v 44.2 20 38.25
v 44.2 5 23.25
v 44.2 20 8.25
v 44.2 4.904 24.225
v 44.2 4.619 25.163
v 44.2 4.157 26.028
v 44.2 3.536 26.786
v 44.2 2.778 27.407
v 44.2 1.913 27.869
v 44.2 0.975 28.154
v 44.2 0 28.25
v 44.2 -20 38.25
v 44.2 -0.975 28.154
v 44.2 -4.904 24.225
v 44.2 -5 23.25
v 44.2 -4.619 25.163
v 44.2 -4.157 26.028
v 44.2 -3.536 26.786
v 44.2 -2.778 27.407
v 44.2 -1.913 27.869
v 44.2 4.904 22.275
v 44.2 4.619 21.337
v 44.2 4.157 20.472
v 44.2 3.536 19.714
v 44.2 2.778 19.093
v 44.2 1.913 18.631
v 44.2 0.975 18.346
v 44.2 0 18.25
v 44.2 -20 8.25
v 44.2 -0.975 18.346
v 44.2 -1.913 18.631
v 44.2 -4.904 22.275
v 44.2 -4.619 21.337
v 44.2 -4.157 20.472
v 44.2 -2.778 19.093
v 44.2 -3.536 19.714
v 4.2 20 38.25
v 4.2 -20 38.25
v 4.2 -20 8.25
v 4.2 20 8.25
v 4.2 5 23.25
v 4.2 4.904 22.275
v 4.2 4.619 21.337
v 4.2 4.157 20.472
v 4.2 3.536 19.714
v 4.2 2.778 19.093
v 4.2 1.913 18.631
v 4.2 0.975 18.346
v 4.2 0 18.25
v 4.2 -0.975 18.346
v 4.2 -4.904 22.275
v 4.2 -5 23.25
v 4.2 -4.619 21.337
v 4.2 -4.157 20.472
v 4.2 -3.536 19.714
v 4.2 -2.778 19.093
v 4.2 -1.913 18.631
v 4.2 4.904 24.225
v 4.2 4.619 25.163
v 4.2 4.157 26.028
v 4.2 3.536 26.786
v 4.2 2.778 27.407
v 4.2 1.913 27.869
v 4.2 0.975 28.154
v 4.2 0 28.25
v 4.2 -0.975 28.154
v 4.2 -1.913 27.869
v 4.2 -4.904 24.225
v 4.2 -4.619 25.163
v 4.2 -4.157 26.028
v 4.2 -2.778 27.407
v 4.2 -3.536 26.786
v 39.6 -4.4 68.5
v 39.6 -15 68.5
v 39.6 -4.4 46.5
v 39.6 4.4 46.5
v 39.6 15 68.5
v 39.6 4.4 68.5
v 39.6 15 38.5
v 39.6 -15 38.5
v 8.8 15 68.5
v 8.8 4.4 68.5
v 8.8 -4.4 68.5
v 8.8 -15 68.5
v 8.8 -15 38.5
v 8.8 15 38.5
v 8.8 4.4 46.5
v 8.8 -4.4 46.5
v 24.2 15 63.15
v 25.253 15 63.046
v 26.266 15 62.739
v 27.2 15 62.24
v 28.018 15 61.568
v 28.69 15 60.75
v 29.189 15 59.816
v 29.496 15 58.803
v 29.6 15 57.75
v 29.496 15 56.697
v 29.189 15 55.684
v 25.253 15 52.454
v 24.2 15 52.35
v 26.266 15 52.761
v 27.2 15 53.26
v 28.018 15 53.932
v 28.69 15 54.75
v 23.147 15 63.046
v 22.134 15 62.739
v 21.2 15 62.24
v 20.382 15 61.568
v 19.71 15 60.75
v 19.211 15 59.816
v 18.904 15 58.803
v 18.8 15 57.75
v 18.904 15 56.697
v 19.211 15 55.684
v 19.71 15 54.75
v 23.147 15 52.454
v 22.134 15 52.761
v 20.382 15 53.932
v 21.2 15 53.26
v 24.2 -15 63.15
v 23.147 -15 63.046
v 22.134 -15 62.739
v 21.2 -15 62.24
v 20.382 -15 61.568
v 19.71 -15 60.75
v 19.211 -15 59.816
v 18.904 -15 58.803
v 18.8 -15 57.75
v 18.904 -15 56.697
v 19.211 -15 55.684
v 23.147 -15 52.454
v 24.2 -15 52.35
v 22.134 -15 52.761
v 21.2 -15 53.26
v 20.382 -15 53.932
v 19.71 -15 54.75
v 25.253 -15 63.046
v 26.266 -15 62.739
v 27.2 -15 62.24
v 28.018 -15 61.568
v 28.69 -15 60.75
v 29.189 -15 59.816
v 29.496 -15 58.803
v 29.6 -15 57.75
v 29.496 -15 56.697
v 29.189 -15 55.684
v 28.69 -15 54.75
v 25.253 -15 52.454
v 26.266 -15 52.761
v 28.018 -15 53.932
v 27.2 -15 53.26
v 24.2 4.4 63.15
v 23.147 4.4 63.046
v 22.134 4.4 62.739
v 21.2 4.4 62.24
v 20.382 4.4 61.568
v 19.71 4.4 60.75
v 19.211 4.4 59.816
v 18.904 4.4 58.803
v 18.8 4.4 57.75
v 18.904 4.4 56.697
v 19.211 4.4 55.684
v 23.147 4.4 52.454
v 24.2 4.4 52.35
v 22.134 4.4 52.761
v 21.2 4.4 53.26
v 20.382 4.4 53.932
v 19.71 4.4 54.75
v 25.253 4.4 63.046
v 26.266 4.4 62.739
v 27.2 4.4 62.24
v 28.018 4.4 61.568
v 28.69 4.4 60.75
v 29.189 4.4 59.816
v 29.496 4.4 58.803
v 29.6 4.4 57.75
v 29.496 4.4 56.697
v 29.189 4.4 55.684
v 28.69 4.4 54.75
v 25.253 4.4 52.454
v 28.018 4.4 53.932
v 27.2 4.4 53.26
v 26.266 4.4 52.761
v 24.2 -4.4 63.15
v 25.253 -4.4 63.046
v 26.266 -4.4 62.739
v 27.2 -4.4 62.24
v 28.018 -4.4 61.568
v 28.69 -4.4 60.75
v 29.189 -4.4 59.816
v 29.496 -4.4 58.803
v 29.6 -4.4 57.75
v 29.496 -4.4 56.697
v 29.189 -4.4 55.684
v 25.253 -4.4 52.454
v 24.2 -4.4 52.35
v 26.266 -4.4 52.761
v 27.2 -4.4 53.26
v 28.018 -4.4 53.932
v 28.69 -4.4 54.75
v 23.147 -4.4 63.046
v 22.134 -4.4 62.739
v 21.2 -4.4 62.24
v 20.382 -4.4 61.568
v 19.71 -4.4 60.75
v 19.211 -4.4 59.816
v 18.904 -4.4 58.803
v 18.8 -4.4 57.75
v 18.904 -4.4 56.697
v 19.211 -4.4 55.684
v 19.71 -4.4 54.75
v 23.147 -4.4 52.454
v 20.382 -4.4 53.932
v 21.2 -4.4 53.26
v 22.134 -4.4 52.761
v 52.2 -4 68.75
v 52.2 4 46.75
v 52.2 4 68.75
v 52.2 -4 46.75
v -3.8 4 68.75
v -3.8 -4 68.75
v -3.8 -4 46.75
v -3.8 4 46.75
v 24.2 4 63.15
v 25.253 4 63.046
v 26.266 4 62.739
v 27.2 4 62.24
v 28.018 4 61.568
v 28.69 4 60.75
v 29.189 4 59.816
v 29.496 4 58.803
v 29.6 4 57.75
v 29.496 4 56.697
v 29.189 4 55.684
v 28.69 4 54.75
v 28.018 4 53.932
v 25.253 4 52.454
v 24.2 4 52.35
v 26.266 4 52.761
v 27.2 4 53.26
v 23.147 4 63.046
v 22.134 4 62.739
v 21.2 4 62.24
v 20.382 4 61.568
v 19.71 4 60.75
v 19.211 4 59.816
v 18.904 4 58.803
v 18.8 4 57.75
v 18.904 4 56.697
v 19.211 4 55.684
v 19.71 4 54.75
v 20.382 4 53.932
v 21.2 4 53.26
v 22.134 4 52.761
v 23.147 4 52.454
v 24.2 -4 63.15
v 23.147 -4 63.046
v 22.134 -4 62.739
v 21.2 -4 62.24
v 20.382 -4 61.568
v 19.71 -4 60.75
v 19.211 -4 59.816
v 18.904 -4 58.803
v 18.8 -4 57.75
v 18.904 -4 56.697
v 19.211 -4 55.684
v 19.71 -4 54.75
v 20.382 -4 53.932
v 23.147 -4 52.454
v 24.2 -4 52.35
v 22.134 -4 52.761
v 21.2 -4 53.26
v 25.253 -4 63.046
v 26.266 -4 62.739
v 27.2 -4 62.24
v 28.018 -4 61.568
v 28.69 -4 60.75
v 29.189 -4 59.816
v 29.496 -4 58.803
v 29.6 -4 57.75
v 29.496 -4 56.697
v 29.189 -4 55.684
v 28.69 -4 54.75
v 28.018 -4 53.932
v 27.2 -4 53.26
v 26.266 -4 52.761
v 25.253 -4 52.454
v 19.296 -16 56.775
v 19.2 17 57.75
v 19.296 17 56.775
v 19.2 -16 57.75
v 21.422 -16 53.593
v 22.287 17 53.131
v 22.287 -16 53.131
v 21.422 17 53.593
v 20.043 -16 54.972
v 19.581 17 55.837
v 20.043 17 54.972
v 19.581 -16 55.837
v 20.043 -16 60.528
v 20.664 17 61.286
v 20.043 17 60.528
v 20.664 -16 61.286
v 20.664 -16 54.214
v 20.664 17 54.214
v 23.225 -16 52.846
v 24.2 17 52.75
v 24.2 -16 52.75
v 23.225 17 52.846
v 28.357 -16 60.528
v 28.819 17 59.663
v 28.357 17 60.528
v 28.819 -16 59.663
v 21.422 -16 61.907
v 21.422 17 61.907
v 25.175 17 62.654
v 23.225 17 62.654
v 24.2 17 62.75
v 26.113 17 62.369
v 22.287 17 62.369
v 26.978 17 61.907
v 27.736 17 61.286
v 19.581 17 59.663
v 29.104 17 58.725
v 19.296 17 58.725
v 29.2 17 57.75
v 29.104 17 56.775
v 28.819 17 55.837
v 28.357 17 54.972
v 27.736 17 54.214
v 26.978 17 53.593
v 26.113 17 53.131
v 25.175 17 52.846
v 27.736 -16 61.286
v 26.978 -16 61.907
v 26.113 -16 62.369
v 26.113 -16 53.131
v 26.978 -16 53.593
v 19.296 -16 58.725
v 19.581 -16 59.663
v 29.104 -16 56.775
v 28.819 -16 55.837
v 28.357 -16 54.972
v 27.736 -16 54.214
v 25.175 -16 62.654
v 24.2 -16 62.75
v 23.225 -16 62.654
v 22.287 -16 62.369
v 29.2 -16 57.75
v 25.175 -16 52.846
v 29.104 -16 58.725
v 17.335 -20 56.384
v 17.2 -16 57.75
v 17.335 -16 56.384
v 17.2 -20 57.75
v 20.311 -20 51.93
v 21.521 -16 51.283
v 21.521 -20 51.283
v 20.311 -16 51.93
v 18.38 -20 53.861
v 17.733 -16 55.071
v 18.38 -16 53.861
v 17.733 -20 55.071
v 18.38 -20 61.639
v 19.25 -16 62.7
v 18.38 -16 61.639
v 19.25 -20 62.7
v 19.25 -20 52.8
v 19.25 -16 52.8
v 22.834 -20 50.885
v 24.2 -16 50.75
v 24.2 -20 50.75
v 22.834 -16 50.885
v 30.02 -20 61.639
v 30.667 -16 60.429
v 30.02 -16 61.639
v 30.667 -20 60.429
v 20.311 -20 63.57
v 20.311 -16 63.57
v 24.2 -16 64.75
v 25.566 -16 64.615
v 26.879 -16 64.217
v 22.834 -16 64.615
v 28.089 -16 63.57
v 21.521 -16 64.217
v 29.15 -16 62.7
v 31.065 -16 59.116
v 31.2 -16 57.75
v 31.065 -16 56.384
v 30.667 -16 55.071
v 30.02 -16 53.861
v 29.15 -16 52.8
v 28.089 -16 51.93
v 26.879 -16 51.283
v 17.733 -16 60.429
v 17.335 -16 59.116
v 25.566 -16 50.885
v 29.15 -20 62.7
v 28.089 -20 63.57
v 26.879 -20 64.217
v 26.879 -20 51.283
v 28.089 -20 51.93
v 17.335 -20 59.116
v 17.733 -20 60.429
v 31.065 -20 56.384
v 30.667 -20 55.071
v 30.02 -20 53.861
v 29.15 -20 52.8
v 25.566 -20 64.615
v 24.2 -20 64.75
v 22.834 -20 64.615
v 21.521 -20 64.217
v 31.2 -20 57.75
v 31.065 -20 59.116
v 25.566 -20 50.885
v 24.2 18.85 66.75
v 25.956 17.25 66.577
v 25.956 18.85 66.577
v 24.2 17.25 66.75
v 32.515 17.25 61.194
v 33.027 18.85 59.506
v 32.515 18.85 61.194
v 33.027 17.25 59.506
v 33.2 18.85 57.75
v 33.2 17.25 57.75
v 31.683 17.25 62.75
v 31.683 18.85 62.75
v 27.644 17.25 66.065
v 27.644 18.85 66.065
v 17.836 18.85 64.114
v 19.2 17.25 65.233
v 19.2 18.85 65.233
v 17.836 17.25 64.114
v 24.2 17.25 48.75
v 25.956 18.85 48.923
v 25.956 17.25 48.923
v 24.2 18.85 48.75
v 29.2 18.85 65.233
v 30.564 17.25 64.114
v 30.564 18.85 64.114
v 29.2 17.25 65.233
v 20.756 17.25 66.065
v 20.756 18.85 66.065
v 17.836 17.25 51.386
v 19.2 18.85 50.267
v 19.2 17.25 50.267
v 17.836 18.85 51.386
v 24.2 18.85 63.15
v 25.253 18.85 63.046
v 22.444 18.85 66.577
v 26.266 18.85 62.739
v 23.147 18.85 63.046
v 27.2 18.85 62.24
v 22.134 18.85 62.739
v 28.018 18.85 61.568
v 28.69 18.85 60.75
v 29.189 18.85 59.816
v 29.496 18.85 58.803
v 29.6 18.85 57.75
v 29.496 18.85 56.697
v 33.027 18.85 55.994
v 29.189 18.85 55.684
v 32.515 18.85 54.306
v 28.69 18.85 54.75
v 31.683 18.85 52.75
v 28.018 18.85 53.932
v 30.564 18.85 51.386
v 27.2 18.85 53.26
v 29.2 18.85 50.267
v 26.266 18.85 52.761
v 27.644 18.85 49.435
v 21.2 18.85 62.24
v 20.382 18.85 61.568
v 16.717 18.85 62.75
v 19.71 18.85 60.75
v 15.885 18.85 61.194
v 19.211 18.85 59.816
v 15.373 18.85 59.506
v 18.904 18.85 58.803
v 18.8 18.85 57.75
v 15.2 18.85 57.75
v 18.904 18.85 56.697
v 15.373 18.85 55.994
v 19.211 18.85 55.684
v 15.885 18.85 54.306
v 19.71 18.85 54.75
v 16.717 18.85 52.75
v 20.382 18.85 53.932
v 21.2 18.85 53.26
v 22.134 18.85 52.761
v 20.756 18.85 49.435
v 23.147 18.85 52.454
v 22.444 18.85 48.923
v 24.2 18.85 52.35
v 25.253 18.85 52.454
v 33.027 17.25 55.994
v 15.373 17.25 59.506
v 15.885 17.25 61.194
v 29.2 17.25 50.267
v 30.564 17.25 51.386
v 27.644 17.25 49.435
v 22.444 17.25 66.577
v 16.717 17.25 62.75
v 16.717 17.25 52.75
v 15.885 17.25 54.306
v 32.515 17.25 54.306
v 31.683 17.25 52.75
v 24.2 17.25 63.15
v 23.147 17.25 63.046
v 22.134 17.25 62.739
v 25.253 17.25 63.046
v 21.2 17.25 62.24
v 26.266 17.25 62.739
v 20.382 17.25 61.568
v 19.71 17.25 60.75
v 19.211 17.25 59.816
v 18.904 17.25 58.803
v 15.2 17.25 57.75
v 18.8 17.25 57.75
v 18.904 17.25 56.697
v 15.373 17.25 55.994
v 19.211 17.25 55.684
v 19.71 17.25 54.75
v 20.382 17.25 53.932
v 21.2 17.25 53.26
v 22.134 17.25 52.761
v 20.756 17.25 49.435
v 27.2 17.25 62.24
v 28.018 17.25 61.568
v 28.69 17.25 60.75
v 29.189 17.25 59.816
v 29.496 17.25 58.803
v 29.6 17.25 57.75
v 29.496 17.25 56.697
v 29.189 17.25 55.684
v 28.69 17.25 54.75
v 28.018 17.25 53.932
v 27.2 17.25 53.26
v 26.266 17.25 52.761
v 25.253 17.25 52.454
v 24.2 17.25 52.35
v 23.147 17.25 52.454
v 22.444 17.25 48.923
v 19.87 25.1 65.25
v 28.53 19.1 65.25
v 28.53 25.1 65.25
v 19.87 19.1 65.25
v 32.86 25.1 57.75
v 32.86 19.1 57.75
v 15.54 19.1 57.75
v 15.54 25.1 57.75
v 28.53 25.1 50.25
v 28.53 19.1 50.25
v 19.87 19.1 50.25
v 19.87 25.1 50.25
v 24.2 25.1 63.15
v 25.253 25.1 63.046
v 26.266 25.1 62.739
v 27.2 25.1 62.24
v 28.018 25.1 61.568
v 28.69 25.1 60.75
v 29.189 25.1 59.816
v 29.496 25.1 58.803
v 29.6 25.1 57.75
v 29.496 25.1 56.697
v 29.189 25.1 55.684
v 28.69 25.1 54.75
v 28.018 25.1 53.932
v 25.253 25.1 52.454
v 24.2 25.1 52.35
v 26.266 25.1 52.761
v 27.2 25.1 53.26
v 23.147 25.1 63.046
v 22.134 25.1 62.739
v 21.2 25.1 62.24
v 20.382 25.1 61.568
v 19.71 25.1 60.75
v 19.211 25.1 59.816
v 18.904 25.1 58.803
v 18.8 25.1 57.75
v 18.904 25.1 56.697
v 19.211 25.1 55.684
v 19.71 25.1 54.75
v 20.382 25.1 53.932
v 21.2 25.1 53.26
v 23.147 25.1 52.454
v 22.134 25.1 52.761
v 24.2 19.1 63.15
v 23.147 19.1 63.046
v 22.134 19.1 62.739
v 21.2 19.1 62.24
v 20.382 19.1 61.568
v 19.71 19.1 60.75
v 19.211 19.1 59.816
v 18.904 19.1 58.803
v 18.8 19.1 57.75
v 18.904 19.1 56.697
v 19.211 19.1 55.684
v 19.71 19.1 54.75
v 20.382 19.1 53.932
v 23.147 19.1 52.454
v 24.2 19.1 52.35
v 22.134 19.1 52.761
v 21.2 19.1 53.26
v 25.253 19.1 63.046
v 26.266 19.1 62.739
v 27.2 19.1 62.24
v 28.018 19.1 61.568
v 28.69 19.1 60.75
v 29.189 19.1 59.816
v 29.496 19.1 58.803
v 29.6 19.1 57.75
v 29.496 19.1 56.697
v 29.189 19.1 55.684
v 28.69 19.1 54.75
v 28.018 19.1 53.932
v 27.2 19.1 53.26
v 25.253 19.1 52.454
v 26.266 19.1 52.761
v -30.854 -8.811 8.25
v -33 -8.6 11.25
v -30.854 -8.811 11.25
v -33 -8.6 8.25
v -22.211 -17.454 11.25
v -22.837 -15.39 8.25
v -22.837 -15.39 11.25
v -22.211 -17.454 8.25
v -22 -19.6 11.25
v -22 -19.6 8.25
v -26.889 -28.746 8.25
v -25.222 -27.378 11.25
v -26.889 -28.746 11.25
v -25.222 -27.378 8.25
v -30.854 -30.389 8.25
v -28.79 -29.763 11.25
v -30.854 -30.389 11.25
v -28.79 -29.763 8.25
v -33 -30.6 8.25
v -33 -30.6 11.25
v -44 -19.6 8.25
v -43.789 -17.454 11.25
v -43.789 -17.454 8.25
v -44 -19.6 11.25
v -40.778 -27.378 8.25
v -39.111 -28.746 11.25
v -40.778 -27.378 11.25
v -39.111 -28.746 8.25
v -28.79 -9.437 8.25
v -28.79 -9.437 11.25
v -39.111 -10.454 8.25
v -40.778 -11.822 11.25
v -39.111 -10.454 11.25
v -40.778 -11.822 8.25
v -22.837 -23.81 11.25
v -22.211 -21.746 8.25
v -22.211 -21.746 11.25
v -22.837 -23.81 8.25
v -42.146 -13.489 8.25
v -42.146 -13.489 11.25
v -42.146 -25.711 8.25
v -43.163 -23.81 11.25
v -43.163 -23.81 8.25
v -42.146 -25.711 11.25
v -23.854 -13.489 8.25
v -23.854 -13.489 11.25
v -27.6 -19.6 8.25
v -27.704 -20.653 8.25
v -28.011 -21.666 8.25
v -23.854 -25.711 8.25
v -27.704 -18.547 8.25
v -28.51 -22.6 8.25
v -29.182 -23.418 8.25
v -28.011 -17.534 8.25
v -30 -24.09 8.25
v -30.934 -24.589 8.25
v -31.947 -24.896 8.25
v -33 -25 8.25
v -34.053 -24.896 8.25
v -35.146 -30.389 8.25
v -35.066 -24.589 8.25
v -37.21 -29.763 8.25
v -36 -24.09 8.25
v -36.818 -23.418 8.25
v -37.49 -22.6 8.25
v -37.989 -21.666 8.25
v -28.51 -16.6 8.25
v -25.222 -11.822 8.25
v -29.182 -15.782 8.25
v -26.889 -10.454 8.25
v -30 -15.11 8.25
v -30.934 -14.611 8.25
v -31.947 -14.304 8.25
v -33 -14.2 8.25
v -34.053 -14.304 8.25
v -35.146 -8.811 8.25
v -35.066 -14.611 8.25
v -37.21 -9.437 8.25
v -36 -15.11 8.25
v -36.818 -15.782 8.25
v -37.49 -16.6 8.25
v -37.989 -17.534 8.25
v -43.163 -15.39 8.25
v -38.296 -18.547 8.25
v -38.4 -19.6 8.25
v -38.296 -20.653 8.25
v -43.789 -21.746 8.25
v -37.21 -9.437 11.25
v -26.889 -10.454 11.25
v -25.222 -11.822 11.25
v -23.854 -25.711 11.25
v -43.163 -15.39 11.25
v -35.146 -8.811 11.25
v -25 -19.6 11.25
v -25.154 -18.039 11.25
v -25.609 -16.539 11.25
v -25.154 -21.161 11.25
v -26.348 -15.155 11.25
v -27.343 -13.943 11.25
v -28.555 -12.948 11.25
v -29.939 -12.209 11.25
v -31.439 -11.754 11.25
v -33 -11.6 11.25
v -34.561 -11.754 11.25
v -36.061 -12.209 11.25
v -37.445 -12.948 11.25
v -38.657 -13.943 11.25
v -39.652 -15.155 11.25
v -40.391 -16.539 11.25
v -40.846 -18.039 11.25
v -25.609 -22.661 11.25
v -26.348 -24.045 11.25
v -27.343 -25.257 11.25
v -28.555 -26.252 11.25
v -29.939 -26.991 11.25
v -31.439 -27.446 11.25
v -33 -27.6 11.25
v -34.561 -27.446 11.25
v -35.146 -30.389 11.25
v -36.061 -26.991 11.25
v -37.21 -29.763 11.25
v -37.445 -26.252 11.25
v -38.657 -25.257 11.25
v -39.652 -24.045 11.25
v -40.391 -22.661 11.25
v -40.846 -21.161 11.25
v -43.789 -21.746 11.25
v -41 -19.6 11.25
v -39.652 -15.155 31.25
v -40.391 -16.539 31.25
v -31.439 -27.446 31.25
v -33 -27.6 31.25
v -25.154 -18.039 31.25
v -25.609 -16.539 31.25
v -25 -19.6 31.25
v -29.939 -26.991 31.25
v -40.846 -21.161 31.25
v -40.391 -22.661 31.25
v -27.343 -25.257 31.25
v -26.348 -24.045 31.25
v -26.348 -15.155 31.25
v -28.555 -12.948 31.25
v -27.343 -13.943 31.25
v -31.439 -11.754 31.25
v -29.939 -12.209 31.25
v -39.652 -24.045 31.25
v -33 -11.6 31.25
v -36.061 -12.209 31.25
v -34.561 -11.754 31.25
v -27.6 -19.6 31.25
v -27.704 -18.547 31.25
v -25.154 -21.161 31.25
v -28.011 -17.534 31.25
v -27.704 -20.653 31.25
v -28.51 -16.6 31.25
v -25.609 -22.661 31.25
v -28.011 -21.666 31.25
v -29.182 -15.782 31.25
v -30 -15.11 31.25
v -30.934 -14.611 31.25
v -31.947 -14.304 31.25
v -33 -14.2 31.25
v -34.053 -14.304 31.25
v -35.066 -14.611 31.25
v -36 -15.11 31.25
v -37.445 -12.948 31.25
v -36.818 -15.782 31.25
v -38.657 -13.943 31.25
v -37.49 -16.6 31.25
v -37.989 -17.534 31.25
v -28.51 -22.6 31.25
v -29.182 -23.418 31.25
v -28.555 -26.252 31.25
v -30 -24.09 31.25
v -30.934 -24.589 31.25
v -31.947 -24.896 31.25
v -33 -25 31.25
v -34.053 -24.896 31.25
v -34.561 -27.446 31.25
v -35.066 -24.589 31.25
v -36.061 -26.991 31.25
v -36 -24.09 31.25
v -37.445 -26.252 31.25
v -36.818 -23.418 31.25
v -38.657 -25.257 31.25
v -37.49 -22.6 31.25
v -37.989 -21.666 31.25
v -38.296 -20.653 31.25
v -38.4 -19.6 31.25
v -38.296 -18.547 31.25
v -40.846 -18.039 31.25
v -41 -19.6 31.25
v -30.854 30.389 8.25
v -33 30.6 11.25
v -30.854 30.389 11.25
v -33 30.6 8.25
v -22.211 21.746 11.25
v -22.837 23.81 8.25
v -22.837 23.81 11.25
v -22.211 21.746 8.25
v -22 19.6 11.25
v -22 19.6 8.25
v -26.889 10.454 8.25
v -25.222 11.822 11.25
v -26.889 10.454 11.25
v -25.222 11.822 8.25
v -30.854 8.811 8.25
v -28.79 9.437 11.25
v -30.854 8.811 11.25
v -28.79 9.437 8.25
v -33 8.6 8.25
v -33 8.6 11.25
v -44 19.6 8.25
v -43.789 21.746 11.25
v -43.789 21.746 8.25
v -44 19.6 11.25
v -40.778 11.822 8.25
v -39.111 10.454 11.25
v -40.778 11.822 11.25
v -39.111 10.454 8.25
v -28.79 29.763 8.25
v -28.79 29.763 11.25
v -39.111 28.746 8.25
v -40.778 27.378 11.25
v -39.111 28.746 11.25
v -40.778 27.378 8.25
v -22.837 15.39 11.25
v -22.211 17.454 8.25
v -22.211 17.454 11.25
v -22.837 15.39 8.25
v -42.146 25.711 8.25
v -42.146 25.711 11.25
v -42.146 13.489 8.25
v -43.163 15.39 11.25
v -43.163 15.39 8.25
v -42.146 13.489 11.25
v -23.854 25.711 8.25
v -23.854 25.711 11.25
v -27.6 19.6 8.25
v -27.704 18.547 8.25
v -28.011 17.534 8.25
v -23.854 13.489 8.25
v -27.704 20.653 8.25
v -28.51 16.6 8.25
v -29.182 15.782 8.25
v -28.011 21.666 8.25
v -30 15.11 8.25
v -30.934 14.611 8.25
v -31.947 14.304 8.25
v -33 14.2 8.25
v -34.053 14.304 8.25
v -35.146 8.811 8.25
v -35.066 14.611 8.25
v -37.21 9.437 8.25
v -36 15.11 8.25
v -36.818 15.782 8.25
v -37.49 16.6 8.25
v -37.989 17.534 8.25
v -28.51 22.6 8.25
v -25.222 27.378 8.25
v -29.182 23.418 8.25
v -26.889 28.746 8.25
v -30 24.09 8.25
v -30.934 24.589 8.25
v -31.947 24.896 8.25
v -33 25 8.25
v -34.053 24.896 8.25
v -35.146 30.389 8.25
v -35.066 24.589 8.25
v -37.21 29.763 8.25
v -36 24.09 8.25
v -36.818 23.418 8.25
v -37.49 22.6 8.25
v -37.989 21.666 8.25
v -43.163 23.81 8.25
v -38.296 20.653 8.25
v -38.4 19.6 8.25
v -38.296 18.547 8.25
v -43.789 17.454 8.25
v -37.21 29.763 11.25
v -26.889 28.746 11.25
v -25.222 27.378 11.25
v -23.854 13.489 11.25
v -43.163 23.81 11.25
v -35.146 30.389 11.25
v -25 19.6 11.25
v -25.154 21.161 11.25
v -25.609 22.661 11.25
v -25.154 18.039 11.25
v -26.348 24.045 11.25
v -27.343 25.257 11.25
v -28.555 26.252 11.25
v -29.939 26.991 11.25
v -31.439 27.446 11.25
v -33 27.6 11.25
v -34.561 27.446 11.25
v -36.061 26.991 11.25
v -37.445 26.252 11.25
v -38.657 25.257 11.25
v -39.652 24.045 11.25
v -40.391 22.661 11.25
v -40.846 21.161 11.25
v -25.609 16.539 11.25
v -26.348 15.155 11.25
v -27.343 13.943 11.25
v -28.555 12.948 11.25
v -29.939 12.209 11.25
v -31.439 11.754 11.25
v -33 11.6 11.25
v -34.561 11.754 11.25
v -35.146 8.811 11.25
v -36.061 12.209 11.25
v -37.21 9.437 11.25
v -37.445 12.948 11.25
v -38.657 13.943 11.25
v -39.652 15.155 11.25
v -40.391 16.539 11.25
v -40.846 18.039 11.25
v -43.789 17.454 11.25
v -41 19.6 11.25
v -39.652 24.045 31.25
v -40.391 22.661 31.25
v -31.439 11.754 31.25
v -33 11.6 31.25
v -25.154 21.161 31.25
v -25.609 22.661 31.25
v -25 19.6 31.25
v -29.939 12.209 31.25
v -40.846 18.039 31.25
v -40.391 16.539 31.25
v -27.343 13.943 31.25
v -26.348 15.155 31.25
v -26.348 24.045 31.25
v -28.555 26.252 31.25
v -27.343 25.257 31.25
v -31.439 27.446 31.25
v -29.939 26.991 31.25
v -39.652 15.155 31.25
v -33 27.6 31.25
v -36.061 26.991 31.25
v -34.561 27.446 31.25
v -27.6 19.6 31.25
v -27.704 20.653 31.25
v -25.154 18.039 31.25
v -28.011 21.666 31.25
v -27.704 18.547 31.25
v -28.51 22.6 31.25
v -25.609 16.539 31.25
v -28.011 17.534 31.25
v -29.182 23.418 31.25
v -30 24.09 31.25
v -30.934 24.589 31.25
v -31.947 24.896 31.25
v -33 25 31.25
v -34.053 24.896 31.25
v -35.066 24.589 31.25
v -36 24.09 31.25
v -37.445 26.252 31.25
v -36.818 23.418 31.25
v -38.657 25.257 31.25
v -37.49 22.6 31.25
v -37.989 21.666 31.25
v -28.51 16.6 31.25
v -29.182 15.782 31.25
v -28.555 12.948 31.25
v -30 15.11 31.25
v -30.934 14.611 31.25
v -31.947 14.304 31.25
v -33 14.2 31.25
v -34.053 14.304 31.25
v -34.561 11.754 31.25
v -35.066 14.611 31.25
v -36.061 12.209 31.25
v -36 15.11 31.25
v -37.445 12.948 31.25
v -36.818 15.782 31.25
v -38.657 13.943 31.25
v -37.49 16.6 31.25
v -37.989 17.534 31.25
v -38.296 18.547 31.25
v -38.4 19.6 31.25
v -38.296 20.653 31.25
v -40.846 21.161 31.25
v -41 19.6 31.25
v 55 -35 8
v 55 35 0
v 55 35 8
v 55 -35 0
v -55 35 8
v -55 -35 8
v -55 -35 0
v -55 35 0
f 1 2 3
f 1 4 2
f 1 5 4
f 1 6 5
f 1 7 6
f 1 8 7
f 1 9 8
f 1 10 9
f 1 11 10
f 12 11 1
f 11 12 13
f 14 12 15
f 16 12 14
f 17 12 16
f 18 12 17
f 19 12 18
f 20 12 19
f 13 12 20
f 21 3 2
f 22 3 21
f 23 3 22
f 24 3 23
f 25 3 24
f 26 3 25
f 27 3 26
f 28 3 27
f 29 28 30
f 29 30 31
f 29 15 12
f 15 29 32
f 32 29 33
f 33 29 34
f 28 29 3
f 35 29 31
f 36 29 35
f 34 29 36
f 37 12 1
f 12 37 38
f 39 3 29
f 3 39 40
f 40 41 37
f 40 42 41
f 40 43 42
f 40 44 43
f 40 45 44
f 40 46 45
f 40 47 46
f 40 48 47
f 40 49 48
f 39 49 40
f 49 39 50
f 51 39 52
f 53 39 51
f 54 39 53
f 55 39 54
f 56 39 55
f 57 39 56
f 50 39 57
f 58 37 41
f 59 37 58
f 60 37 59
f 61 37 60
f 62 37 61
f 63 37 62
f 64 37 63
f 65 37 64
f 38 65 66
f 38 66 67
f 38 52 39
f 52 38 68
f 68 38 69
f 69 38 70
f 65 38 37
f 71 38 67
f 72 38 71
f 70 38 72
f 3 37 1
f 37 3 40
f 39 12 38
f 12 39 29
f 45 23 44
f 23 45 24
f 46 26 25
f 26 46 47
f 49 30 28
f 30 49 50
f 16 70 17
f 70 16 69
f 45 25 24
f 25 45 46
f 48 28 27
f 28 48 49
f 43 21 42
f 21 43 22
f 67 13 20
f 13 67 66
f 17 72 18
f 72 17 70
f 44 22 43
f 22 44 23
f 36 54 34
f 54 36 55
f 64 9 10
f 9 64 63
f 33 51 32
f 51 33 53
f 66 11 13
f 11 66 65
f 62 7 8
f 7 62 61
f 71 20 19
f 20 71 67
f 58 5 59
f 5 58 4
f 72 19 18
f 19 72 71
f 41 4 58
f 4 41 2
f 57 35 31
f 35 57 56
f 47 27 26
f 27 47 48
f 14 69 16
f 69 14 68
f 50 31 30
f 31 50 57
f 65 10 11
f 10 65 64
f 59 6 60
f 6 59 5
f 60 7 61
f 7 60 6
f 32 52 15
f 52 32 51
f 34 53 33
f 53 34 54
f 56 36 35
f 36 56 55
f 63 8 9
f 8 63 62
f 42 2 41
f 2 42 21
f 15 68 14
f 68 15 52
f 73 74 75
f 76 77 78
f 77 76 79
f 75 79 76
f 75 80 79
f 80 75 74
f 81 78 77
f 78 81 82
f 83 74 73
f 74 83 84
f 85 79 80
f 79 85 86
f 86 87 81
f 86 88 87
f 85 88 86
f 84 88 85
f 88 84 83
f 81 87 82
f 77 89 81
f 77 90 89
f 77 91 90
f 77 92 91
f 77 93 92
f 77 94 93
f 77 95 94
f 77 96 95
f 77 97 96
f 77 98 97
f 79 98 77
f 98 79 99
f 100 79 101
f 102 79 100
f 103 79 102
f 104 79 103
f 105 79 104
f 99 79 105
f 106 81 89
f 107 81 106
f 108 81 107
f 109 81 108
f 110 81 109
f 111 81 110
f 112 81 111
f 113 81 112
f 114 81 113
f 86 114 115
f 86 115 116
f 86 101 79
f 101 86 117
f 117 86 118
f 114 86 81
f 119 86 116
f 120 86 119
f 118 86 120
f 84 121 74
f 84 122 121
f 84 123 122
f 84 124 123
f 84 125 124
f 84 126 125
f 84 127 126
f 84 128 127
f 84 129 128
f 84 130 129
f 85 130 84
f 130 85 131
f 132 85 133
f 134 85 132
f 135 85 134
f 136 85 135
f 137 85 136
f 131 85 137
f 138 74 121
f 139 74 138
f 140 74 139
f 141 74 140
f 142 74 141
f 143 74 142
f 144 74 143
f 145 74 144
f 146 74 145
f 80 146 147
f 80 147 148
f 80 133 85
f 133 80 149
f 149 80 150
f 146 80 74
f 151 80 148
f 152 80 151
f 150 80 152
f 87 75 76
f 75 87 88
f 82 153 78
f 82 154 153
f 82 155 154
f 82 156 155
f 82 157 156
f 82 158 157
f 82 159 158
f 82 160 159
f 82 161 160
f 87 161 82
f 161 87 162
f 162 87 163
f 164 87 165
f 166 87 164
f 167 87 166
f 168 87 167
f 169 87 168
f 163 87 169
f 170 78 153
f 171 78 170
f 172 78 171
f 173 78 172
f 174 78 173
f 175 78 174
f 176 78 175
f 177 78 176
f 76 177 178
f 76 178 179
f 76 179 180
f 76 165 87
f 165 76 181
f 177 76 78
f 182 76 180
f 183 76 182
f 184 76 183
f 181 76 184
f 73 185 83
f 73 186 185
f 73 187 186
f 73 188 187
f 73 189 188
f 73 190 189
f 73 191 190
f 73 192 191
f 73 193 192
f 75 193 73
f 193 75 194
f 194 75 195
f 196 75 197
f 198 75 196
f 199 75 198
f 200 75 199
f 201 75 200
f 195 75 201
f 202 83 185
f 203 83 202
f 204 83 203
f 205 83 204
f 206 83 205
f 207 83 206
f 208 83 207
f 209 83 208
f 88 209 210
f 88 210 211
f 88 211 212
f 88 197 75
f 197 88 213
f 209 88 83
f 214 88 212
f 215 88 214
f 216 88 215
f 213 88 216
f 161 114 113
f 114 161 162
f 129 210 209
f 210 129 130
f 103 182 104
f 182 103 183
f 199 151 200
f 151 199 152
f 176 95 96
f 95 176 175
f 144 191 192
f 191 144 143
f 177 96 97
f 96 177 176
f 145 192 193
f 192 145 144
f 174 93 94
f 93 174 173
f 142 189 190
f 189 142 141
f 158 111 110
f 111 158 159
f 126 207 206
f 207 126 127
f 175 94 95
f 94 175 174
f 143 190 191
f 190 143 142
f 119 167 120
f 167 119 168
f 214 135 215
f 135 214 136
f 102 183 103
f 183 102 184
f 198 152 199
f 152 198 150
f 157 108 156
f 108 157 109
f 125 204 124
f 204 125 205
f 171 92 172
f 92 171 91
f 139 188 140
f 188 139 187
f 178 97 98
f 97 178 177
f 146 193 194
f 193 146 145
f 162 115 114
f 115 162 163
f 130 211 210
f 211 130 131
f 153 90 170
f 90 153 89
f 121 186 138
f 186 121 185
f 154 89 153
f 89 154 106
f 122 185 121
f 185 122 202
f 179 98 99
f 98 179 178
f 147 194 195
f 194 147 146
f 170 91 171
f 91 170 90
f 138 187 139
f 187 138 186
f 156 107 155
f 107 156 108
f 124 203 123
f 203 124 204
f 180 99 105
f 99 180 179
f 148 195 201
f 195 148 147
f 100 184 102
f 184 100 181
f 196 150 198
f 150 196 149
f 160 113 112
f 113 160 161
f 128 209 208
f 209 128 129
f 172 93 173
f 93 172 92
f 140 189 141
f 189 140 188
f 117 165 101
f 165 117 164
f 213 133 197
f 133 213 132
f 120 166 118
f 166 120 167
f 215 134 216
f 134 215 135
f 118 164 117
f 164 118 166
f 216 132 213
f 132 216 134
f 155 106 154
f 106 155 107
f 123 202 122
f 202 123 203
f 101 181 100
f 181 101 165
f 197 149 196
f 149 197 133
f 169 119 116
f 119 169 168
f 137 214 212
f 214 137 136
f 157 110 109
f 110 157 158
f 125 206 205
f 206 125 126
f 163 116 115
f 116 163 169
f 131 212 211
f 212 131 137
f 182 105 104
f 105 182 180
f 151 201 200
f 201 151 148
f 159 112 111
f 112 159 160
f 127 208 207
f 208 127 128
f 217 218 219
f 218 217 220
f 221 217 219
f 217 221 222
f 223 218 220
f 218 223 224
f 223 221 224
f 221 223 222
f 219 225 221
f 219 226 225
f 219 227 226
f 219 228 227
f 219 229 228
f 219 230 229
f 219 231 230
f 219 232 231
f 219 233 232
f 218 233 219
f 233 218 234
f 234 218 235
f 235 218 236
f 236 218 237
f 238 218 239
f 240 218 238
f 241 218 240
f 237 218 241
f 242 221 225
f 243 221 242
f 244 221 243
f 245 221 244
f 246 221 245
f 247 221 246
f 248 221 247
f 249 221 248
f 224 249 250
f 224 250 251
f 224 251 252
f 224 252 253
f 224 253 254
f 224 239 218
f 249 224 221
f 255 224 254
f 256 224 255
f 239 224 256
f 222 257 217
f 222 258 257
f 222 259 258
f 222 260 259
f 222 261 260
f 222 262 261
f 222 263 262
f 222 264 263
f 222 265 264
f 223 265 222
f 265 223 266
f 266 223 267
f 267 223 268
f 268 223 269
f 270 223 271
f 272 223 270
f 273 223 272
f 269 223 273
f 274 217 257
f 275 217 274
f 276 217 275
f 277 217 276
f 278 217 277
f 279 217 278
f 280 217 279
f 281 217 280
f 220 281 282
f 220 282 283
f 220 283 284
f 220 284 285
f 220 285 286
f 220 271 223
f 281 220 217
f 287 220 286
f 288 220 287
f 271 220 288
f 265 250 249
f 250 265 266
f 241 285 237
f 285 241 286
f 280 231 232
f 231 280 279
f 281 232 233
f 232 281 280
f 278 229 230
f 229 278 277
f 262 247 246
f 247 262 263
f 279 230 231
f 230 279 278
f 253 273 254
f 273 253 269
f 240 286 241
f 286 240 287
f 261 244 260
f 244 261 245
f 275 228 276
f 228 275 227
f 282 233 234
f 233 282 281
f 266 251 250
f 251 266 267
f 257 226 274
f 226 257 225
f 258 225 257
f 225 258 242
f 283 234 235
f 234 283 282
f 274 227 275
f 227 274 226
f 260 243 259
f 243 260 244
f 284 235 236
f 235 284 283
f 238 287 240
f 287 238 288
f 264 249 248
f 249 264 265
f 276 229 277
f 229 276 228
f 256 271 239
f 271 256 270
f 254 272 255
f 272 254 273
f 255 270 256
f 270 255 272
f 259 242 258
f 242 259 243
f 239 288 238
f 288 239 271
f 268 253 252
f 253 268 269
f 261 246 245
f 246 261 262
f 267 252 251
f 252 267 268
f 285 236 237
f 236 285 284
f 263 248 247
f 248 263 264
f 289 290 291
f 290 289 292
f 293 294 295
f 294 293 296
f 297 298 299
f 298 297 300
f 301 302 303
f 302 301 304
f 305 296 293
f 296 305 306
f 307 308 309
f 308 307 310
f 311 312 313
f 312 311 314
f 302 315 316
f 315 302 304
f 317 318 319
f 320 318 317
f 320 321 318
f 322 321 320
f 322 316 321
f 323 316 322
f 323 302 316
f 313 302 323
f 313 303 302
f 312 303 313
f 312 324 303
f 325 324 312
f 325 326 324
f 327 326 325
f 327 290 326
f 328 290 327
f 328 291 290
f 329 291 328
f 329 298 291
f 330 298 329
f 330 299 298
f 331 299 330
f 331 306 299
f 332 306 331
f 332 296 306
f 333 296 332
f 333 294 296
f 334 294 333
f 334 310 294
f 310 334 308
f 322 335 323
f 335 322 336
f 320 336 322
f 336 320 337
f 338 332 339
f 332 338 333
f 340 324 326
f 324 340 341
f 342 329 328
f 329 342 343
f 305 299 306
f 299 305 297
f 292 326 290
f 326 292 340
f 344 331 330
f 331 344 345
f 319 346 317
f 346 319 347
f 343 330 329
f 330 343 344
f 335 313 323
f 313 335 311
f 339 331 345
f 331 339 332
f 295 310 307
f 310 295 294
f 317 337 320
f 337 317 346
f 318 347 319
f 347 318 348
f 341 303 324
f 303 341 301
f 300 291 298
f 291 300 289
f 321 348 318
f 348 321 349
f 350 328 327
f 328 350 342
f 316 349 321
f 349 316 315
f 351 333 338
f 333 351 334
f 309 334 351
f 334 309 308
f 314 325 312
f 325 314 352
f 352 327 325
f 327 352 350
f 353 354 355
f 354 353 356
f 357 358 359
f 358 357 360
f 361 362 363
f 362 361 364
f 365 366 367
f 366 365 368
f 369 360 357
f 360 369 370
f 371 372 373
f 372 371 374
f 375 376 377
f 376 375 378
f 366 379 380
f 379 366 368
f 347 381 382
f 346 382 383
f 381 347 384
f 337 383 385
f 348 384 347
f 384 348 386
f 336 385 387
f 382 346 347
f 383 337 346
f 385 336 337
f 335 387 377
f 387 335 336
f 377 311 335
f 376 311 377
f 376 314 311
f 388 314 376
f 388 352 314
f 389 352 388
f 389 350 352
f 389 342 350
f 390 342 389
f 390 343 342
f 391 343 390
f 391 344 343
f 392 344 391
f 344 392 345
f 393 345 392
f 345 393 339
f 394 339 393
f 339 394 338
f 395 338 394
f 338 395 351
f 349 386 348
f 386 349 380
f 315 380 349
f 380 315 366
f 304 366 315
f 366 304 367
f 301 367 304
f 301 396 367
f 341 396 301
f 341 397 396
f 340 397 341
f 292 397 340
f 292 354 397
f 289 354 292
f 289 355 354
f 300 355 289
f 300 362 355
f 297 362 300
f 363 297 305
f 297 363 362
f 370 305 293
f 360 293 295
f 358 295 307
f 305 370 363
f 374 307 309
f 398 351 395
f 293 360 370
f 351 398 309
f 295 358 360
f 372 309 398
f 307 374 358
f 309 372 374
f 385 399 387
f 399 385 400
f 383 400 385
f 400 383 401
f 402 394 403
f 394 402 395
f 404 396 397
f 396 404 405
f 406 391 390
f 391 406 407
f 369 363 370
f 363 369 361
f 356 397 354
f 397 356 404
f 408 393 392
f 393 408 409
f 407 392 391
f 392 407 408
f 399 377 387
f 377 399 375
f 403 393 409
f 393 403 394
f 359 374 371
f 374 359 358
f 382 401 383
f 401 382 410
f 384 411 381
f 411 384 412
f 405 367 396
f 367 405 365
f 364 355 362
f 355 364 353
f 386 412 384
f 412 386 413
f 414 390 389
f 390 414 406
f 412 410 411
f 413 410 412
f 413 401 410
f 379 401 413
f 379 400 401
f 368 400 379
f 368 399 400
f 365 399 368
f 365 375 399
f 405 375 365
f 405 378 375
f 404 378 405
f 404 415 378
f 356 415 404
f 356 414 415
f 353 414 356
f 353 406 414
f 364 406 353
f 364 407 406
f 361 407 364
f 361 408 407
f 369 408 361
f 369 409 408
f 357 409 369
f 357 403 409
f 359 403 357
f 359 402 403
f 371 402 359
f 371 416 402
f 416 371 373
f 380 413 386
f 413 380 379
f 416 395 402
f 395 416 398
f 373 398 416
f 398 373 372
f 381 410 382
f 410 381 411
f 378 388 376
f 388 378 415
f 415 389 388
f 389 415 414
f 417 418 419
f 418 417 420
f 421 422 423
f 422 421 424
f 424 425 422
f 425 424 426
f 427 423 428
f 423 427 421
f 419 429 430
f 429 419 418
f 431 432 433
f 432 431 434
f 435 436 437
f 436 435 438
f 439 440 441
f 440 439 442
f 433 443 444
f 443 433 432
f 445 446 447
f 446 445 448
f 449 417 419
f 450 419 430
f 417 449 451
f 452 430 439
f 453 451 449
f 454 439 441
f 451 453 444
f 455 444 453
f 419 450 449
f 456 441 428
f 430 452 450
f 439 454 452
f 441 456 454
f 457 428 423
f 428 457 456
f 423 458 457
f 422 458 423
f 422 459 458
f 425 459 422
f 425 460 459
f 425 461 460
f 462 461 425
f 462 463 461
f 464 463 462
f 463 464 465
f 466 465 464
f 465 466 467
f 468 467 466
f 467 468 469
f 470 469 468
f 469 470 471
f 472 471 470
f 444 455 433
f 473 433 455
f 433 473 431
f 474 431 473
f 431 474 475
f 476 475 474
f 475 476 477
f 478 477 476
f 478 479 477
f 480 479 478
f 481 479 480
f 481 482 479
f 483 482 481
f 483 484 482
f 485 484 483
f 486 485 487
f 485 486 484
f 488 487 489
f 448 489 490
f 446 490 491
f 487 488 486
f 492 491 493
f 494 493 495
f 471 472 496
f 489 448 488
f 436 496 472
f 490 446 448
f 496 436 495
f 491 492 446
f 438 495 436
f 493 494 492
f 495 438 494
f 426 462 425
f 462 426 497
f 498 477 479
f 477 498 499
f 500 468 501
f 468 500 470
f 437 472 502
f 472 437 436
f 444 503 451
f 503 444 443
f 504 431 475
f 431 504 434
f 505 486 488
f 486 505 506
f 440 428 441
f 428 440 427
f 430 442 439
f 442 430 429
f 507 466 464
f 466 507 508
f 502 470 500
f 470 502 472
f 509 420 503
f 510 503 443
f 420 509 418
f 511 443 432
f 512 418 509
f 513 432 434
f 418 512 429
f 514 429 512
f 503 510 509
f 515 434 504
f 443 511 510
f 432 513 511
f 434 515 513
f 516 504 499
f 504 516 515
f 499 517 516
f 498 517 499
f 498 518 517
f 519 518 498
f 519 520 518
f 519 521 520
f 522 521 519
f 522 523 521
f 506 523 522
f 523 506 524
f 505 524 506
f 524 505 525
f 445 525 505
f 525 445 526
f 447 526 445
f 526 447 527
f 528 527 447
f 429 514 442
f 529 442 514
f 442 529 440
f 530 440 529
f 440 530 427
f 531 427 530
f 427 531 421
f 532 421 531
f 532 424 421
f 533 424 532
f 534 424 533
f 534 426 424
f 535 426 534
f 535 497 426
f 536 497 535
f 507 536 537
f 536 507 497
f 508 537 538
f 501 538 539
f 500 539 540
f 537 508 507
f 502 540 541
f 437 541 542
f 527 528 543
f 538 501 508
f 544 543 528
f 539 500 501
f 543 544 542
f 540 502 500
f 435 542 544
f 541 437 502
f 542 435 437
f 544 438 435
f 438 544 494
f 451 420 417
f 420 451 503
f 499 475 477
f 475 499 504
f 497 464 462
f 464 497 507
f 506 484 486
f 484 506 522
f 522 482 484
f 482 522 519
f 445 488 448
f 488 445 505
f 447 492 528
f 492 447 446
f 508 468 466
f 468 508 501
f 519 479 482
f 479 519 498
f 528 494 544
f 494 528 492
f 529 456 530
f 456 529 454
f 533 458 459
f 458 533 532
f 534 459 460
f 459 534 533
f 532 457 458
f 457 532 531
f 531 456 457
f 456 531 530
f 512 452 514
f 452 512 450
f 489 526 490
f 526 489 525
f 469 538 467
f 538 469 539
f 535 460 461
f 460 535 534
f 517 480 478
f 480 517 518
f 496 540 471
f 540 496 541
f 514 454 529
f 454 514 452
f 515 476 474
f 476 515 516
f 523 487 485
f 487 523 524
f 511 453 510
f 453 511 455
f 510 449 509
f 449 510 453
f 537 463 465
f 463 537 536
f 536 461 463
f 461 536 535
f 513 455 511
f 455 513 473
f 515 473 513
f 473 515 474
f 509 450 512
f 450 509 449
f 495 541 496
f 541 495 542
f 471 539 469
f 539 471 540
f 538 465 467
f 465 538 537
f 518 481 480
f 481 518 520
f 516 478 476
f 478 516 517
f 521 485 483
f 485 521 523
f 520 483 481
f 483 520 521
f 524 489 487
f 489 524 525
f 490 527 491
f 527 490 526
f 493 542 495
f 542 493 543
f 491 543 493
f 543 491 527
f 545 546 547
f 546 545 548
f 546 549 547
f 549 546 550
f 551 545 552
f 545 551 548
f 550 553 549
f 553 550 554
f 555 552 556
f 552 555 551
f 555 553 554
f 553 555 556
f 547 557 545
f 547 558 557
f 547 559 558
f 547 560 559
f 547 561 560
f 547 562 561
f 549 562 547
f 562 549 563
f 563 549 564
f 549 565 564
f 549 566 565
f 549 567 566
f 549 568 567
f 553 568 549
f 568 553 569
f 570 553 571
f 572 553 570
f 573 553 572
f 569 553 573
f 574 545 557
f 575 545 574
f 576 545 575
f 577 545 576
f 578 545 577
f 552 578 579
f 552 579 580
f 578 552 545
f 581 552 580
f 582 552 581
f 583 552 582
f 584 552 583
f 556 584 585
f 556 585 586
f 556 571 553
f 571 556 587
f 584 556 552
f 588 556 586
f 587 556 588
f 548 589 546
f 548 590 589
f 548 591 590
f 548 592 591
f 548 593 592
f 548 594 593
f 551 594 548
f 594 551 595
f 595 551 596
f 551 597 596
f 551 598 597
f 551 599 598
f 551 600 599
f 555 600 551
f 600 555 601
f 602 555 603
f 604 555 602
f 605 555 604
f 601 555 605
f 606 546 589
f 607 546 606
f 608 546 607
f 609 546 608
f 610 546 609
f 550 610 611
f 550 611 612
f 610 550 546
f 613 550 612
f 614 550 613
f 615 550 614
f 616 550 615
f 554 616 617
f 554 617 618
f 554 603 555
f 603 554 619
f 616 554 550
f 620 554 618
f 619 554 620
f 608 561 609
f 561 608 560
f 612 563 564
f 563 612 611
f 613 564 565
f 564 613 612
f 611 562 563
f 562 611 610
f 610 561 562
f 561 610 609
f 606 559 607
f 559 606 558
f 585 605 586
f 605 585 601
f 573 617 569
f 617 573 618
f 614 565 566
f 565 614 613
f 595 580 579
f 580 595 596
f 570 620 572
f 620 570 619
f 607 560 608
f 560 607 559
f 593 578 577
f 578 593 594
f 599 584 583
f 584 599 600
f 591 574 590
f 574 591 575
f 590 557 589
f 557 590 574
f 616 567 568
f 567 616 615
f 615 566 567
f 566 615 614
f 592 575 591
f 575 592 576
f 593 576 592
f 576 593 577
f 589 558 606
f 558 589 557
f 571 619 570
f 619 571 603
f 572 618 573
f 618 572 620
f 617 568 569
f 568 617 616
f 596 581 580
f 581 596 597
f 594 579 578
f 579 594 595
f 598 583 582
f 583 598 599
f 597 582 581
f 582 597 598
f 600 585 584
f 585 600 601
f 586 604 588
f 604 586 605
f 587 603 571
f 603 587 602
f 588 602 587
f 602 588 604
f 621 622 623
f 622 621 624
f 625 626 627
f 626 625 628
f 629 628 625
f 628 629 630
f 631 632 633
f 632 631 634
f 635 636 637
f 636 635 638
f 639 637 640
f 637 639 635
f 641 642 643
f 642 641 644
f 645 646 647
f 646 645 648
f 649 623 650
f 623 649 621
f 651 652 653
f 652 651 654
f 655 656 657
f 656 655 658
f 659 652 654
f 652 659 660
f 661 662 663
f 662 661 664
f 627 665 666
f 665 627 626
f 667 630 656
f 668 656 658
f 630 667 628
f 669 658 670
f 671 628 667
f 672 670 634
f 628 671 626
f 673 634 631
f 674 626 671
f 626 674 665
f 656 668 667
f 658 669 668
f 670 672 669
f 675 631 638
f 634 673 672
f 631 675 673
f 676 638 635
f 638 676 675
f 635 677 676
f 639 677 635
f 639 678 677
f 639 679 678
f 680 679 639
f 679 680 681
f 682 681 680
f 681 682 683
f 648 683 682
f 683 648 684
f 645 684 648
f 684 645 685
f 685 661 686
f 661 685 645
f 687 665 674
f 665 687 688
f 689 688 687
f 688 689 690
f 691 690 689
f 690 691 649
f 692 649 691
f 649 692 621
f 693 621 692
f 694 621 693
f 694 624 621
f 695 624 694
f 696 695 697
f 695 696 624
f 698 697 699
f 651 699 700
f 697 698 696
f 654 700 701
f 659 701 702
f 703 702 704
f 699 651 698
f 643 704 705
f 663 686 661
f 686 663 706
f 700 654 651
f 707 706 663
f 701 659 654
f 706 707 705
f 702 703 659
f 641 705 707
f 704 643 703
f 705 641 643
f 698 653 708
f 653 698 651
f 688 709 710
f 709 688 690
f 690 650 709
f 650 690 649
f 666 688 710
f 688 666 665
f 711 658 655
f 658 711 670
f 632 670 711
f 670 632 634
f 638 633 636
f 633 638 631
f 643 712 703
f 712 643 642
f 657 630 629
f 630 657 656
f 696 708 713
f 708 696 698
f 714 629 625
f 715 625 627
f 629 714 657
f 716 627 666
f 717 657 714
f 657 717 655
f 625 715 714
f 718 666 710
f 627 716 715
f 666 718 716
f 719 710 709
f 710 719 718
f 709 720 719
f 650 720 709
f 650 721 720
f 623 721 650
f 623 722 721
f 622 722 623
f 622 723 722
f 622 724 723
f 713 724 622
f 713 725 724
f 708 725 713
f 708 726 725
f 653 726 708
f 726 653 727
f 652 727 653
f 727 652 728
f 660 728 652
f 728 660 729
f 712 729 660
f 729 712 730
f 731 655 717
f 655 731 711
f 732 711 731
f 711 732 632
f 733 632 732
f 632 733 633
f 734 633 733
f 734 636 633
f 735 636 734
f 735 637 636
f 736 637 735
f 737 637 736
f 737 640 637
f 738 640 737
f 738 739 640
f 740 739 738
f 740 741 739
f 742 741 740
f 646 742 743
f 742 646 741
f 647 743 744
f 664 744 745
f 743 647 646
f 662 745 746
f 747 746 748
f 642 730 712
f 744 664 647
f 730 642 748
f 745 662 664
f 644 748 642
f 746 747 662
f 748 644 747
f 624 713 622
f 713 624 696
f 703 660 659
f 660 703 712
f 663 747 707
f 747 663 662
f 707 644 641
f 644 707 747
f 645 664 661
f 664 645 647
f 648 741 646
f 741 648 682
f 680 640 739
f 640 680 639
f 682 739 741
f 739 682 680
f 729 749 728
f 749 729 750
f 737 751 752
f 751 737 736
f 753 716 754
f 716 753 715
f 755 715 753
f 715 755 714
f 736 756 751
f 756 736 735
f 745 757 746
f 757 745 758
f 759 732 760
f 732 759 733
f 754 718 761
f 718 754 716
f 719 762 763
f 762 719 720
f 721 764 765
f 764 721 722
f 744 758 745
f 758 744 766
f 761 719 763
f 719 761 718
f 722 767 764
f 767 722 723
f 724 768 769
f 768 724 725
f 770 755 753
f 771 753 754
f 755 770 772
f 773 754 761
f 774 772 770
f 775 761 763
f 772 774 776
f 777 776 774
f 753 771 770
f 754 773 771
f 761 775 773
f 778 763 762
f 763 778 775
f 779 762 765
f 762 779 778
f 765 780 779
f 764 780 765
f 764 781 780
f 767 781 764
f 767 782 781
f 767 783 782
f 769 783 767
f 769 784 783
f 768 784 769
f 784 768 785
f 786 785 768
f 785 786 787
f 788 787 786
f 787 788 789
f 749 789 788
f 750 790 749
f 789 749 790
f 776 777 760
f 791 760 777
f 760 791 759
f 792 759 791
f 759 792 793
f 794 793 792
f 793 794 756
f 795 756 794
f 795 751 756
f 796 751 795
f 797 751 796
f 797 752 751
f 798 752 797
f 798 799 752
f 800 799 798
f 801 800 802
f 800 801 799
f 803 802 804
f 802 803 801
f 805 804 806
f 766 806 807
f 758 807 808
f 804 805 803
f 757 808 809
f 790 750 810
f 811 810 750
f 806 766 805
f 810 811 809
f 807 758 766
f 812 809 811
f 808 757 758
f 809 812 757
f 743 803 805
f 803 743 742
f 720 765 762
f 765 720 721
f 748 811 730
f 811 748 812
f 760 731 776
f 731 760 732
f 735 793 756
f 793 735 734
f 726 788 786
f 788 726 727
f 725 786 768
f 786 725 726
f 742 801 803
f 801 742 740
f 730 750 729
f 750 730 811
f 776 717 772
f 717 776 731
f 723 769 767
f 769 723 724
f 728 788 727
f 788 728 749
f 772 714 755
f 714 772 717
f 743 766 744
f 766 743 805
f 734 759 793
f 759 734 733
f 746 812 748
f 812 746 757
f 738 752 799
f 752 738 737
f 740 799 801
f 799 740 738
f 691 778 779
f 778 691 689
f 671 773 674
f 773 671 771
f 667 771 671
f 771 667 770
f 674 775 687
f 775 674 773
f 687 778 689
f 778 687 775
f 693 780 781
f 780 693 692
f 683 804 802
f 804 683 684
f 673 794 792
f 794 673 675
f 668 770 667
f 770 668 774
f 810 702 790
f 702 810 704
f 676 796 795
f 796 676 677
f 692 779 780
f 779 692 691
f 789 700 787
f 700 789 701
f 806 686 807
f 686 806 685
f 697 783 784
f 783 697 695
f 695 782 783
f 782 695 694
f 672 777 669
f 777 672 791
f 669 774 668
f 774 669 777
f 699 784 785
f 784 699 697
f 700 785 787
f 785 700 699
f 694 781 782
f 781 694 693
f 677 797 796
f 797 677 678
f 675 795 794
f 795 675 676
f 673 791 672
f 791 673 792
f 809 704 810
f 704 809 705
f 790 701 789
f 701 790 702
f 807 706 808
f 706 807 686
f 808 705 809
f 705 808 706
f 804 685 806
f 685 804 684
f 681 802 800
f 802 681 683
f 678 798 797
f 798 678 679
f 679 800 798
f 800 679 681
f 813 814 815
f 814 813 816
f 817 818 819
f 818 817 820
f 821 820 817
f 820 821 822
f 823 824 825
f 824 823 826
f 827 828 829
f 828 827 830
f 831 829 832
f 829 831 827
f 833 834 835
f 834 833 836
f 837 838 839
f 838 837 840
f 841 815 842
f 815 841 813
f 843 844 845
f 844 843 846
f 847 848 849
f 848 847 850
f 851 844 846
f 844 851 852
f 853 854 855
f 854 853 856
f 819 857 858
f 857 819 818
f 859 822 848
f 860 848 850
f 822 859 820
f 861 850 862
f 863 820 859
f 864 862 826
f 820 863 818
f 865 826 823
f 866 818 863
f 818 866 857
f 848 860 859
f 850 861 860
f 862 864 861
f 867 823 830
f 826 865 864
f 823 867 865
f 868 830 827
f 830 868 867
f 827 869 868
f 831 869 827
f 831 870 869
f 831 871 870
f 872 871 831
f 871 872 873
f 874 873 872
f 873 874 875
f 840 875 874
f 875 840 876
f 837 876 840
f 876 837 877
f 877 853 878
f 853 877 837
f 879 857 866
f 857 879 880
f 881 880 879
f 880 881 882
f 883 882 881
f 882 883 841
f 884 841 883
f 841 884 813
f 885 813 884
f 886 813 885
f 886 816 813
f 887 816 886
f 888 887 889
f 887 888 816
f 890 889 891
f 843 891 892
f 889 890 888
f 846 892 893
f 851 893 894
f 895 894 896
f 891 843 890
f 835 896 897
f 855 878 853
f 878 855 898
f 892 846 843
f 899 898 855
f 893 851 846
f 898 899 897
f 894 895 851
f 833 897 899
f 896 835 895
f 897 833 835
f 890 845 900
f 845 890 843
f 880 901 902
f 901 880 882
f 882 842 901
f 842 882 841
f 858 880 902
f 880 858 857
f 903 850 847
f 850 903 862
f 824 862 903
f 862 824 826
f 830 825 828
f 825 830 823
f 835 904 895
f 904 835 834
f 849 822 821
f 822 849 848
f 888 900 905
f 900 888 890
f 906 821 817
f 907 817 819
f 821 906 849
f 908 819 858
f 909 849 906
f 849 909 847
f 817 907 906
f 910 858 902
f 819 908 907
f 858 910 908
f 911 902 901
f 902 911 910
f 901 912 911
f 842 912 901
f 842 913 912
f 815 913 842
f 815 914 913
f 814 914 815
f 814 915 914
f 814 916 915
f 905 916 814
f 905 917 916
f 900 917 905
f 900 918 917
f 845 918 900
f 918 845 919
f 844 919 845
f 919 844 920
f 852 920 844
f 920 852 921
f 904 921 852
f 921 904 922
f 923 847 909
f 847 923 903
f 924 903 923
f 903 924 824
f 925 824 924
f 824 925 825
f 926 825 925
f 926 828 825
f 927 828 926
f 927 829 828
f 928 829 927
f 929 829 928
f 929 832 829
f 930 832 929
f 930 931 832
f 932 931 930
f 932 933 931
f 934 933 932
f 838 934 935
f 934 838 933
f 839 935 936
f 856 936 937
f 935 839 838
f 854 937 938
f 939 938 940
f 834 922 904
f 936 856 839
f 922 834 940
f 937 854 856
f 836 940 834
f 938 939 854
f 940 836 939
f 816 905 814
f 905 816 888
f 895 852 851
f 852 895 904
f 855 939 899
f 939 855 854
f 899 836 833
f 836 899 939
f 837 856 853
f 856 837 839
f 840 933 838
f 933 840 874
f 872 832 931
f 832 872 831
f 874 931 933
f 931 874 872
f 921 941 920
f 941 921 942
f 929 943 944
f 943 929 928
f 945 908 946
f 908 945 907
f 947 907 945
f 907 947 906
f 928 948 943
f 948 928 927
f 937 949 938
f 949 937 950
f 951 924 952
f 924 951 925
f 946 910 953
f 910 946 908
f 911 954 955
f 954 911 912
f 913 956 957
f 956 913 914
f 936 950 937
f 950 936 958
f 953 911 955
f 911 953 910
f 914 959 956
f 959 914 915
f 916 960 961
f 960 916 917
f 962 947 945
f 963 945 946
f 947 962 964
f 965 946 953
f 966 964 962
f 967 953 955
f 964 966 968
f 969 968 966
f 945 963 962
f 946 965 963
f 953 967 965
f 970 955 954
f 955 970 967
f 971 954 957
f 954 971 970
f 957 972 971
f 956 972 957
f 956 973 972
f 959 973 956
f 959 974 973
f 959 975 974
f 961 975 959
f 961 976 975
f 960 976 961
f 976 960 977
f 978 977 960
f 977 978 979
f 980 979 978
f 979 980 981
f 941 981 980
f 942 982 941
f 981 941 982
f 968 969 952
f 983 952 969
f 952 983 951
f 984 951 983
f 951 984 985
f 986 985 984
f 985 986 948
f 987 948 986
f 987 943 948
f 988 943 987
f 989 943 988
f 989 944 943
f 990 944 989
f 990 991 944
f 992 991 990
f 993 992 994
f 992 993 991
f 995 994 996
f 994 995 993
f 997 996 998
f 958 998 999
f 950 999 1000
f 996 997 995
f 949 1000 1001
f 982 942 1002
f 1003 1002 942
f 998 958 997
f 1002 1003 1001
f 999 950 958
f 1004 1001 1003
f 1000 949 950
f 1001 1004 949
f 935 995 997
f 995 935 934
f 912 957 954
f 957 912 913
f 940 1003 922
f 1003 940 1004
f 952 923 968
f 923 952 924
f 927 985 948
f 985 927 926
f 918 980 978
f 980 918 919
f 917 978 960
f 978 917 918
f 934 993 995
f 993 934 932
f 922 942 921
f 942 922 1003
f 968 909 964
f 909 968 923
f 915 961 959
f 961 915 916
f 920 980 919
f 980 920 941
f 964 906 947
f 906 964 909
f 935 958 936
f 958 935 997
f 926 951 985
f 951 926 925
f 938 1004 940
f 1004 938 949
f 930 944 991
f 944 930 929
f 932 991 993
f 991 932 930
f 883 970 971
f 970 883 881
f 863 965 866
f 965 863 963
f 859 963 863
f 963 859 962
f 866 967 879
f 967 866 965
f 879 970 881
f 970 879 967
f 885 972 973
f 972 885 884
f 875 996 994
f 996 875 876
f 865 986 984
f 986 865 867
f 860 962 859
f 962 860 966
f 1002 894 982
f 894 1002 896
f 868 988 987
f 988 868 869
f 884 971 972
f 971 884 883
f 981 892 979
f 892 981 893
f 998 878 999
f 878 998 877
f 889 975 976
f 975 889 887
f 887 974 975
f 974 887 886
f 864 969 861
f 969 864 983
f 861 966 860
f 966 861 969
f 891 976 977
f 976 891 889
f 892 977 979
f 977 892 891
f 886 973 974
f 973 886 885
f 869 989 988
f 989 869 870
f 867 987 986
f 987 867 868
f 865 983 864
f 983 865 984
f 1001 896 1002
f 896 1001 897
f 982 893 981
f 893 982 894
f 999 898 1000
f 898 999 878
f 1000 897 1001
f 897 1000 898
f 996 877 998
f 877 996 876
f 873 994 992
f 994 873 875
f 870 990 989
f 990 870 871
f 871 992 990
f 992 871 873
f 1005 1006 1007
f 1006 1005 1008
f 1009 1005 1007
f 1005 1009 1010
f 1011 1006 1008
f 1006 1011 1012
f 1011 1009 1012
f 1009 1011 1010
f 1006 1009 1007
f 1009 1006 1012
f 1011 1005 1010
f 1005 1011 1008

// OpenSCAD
$fn = 32;

// ------------------------------------------------------------------------
// Indexing jig: plate 110 x 70 mm, pin d10
// Every part is its own module, assembly() places every instance.
// ------------------------------------------------------------------------

// --- part 1 ---
module jig_plate() {
  difference() {
    translate([-55, -35, 0]) cube([110, 70, 8]);
  }
}

// --- part 2 ---
module locator_block() {
  difference() {
    translate([-20, -20, 0]) cube([40, 40, 30]);
    translate([0, 0, 15]) rotate([0, 90, 0]) cylinder(h = 42, d = 10, center = true);
  }
}

// --- part 3 ---
module index_fork() {
  difference() {
    translate([-15.4, -15, 0]) cube([30.8, 30, 30]);
    translate([-16.4, -4.4, 8]) cube([32.8, 8.8, 23]);
    translate([0, 0, 19.25]) rotate([90, 0, 0]) cylinder(h = 32, d = 10.8, center = true);
  }
}

// --- part 4 ---
module index_arm() {
  difference() {
    translate([-28, -4, 0]) cube([56, 8, 22]);
    translate([0, 0, 11]) rotate([90, 0, 0]) cylinder(h = 10, d = 10.8, center = true);
  }
}

// --- part 5 ---
module index_pin() {
  rotate([0, 90, 0]) cylinder(h = 34, d = 10, center = true);
  translate([-20, 0, 0]) rotate([0, 90, 0]) cylinder(h = 4, d = 14);
}

// --- part 6 ---
module pin_washer() {
  difference() {
      translate([0, 0, 0]) cylinder(h = 1.6, d = 18);
      translate([0, 0, -1]) cylinder(h = 3.6, d = 10.8);
    }
}

// --- part 7 ---
module lock_nut() {
  difference() {
    linear_extrude(height = 6) polygon(points = [[8.66, 0], [4.33, 7.5], [-4.33, 7.5], [-8.66, 0], [-4.33, -7.5], [4.33, -7.5]]);
    translate([0, 0, -1]) cylinder(h = 8, d = 10.8);
  }
}

// --- part 8 ---
module guide_bush_a() {
  difference() {
    union() {
      cylinder(h = 3, d = 22);
      translate([0, 0, 3]) cylinder(h = 20, d = 16);
    }
    translate([0, 0, -1]) cylinder(h = 25, d = 10.8);
  }
}

// --- part 9 ---
module guide_bush_b() {
  difference() {
    union() {
      cylinder(h = 3, d = 22);
      translate([0, 0, 3]) cylinder(h = 20, d = 16);
    }
    translate([0, 0, -1]) cylinder(h = 25, d = 10.8);
  }
}

// --- assembly ---
module assembly() {
  color([0.80, 0.24, 0.20]) translate([0, 0, 0]) rotate([0, 0, 0]) jig_plate();
  color([0.20, 0.45, 0.75]) translate([24.2, 0, 8.25]) rotate([0, 0, 0]) locator_block();
  color([0.25, 0.62, 0.32]) translate([24.2, 0, 38.5]) rotate([0, 0, 0]) index_fork();
  color([0.92, 0.70, 0.18]) translate([24.2, 0, 46.75]) rotate([0, 0, 0]) index_arm();
  color([0.58, 0.35, 0.70]) translate([24.2, 0, 57.75]) rotate([0, 0, 90]) index_pin();
  color([0.16, 0.66, 0.66]) translate([24.2, 18.85, 57.75]) rotate([90, 0, 0]) pin_washer();
  color([0.85, 0.48, 0.18]) translate([24.2, 25.1, 57.75]) rotate([90, 0, 0]) lock_nut();
  color([0.55, 0.60, 0.65]) translate([-33, -19.6, 8.25]) rotate([0, 0, 0]) guide_bush_a();
  color([0.75, 0.30, 0.55]) translate([-33, 19.6, 8.25]) rotate([0, 0, 0]) guide_bush_b();
}

assembly();
